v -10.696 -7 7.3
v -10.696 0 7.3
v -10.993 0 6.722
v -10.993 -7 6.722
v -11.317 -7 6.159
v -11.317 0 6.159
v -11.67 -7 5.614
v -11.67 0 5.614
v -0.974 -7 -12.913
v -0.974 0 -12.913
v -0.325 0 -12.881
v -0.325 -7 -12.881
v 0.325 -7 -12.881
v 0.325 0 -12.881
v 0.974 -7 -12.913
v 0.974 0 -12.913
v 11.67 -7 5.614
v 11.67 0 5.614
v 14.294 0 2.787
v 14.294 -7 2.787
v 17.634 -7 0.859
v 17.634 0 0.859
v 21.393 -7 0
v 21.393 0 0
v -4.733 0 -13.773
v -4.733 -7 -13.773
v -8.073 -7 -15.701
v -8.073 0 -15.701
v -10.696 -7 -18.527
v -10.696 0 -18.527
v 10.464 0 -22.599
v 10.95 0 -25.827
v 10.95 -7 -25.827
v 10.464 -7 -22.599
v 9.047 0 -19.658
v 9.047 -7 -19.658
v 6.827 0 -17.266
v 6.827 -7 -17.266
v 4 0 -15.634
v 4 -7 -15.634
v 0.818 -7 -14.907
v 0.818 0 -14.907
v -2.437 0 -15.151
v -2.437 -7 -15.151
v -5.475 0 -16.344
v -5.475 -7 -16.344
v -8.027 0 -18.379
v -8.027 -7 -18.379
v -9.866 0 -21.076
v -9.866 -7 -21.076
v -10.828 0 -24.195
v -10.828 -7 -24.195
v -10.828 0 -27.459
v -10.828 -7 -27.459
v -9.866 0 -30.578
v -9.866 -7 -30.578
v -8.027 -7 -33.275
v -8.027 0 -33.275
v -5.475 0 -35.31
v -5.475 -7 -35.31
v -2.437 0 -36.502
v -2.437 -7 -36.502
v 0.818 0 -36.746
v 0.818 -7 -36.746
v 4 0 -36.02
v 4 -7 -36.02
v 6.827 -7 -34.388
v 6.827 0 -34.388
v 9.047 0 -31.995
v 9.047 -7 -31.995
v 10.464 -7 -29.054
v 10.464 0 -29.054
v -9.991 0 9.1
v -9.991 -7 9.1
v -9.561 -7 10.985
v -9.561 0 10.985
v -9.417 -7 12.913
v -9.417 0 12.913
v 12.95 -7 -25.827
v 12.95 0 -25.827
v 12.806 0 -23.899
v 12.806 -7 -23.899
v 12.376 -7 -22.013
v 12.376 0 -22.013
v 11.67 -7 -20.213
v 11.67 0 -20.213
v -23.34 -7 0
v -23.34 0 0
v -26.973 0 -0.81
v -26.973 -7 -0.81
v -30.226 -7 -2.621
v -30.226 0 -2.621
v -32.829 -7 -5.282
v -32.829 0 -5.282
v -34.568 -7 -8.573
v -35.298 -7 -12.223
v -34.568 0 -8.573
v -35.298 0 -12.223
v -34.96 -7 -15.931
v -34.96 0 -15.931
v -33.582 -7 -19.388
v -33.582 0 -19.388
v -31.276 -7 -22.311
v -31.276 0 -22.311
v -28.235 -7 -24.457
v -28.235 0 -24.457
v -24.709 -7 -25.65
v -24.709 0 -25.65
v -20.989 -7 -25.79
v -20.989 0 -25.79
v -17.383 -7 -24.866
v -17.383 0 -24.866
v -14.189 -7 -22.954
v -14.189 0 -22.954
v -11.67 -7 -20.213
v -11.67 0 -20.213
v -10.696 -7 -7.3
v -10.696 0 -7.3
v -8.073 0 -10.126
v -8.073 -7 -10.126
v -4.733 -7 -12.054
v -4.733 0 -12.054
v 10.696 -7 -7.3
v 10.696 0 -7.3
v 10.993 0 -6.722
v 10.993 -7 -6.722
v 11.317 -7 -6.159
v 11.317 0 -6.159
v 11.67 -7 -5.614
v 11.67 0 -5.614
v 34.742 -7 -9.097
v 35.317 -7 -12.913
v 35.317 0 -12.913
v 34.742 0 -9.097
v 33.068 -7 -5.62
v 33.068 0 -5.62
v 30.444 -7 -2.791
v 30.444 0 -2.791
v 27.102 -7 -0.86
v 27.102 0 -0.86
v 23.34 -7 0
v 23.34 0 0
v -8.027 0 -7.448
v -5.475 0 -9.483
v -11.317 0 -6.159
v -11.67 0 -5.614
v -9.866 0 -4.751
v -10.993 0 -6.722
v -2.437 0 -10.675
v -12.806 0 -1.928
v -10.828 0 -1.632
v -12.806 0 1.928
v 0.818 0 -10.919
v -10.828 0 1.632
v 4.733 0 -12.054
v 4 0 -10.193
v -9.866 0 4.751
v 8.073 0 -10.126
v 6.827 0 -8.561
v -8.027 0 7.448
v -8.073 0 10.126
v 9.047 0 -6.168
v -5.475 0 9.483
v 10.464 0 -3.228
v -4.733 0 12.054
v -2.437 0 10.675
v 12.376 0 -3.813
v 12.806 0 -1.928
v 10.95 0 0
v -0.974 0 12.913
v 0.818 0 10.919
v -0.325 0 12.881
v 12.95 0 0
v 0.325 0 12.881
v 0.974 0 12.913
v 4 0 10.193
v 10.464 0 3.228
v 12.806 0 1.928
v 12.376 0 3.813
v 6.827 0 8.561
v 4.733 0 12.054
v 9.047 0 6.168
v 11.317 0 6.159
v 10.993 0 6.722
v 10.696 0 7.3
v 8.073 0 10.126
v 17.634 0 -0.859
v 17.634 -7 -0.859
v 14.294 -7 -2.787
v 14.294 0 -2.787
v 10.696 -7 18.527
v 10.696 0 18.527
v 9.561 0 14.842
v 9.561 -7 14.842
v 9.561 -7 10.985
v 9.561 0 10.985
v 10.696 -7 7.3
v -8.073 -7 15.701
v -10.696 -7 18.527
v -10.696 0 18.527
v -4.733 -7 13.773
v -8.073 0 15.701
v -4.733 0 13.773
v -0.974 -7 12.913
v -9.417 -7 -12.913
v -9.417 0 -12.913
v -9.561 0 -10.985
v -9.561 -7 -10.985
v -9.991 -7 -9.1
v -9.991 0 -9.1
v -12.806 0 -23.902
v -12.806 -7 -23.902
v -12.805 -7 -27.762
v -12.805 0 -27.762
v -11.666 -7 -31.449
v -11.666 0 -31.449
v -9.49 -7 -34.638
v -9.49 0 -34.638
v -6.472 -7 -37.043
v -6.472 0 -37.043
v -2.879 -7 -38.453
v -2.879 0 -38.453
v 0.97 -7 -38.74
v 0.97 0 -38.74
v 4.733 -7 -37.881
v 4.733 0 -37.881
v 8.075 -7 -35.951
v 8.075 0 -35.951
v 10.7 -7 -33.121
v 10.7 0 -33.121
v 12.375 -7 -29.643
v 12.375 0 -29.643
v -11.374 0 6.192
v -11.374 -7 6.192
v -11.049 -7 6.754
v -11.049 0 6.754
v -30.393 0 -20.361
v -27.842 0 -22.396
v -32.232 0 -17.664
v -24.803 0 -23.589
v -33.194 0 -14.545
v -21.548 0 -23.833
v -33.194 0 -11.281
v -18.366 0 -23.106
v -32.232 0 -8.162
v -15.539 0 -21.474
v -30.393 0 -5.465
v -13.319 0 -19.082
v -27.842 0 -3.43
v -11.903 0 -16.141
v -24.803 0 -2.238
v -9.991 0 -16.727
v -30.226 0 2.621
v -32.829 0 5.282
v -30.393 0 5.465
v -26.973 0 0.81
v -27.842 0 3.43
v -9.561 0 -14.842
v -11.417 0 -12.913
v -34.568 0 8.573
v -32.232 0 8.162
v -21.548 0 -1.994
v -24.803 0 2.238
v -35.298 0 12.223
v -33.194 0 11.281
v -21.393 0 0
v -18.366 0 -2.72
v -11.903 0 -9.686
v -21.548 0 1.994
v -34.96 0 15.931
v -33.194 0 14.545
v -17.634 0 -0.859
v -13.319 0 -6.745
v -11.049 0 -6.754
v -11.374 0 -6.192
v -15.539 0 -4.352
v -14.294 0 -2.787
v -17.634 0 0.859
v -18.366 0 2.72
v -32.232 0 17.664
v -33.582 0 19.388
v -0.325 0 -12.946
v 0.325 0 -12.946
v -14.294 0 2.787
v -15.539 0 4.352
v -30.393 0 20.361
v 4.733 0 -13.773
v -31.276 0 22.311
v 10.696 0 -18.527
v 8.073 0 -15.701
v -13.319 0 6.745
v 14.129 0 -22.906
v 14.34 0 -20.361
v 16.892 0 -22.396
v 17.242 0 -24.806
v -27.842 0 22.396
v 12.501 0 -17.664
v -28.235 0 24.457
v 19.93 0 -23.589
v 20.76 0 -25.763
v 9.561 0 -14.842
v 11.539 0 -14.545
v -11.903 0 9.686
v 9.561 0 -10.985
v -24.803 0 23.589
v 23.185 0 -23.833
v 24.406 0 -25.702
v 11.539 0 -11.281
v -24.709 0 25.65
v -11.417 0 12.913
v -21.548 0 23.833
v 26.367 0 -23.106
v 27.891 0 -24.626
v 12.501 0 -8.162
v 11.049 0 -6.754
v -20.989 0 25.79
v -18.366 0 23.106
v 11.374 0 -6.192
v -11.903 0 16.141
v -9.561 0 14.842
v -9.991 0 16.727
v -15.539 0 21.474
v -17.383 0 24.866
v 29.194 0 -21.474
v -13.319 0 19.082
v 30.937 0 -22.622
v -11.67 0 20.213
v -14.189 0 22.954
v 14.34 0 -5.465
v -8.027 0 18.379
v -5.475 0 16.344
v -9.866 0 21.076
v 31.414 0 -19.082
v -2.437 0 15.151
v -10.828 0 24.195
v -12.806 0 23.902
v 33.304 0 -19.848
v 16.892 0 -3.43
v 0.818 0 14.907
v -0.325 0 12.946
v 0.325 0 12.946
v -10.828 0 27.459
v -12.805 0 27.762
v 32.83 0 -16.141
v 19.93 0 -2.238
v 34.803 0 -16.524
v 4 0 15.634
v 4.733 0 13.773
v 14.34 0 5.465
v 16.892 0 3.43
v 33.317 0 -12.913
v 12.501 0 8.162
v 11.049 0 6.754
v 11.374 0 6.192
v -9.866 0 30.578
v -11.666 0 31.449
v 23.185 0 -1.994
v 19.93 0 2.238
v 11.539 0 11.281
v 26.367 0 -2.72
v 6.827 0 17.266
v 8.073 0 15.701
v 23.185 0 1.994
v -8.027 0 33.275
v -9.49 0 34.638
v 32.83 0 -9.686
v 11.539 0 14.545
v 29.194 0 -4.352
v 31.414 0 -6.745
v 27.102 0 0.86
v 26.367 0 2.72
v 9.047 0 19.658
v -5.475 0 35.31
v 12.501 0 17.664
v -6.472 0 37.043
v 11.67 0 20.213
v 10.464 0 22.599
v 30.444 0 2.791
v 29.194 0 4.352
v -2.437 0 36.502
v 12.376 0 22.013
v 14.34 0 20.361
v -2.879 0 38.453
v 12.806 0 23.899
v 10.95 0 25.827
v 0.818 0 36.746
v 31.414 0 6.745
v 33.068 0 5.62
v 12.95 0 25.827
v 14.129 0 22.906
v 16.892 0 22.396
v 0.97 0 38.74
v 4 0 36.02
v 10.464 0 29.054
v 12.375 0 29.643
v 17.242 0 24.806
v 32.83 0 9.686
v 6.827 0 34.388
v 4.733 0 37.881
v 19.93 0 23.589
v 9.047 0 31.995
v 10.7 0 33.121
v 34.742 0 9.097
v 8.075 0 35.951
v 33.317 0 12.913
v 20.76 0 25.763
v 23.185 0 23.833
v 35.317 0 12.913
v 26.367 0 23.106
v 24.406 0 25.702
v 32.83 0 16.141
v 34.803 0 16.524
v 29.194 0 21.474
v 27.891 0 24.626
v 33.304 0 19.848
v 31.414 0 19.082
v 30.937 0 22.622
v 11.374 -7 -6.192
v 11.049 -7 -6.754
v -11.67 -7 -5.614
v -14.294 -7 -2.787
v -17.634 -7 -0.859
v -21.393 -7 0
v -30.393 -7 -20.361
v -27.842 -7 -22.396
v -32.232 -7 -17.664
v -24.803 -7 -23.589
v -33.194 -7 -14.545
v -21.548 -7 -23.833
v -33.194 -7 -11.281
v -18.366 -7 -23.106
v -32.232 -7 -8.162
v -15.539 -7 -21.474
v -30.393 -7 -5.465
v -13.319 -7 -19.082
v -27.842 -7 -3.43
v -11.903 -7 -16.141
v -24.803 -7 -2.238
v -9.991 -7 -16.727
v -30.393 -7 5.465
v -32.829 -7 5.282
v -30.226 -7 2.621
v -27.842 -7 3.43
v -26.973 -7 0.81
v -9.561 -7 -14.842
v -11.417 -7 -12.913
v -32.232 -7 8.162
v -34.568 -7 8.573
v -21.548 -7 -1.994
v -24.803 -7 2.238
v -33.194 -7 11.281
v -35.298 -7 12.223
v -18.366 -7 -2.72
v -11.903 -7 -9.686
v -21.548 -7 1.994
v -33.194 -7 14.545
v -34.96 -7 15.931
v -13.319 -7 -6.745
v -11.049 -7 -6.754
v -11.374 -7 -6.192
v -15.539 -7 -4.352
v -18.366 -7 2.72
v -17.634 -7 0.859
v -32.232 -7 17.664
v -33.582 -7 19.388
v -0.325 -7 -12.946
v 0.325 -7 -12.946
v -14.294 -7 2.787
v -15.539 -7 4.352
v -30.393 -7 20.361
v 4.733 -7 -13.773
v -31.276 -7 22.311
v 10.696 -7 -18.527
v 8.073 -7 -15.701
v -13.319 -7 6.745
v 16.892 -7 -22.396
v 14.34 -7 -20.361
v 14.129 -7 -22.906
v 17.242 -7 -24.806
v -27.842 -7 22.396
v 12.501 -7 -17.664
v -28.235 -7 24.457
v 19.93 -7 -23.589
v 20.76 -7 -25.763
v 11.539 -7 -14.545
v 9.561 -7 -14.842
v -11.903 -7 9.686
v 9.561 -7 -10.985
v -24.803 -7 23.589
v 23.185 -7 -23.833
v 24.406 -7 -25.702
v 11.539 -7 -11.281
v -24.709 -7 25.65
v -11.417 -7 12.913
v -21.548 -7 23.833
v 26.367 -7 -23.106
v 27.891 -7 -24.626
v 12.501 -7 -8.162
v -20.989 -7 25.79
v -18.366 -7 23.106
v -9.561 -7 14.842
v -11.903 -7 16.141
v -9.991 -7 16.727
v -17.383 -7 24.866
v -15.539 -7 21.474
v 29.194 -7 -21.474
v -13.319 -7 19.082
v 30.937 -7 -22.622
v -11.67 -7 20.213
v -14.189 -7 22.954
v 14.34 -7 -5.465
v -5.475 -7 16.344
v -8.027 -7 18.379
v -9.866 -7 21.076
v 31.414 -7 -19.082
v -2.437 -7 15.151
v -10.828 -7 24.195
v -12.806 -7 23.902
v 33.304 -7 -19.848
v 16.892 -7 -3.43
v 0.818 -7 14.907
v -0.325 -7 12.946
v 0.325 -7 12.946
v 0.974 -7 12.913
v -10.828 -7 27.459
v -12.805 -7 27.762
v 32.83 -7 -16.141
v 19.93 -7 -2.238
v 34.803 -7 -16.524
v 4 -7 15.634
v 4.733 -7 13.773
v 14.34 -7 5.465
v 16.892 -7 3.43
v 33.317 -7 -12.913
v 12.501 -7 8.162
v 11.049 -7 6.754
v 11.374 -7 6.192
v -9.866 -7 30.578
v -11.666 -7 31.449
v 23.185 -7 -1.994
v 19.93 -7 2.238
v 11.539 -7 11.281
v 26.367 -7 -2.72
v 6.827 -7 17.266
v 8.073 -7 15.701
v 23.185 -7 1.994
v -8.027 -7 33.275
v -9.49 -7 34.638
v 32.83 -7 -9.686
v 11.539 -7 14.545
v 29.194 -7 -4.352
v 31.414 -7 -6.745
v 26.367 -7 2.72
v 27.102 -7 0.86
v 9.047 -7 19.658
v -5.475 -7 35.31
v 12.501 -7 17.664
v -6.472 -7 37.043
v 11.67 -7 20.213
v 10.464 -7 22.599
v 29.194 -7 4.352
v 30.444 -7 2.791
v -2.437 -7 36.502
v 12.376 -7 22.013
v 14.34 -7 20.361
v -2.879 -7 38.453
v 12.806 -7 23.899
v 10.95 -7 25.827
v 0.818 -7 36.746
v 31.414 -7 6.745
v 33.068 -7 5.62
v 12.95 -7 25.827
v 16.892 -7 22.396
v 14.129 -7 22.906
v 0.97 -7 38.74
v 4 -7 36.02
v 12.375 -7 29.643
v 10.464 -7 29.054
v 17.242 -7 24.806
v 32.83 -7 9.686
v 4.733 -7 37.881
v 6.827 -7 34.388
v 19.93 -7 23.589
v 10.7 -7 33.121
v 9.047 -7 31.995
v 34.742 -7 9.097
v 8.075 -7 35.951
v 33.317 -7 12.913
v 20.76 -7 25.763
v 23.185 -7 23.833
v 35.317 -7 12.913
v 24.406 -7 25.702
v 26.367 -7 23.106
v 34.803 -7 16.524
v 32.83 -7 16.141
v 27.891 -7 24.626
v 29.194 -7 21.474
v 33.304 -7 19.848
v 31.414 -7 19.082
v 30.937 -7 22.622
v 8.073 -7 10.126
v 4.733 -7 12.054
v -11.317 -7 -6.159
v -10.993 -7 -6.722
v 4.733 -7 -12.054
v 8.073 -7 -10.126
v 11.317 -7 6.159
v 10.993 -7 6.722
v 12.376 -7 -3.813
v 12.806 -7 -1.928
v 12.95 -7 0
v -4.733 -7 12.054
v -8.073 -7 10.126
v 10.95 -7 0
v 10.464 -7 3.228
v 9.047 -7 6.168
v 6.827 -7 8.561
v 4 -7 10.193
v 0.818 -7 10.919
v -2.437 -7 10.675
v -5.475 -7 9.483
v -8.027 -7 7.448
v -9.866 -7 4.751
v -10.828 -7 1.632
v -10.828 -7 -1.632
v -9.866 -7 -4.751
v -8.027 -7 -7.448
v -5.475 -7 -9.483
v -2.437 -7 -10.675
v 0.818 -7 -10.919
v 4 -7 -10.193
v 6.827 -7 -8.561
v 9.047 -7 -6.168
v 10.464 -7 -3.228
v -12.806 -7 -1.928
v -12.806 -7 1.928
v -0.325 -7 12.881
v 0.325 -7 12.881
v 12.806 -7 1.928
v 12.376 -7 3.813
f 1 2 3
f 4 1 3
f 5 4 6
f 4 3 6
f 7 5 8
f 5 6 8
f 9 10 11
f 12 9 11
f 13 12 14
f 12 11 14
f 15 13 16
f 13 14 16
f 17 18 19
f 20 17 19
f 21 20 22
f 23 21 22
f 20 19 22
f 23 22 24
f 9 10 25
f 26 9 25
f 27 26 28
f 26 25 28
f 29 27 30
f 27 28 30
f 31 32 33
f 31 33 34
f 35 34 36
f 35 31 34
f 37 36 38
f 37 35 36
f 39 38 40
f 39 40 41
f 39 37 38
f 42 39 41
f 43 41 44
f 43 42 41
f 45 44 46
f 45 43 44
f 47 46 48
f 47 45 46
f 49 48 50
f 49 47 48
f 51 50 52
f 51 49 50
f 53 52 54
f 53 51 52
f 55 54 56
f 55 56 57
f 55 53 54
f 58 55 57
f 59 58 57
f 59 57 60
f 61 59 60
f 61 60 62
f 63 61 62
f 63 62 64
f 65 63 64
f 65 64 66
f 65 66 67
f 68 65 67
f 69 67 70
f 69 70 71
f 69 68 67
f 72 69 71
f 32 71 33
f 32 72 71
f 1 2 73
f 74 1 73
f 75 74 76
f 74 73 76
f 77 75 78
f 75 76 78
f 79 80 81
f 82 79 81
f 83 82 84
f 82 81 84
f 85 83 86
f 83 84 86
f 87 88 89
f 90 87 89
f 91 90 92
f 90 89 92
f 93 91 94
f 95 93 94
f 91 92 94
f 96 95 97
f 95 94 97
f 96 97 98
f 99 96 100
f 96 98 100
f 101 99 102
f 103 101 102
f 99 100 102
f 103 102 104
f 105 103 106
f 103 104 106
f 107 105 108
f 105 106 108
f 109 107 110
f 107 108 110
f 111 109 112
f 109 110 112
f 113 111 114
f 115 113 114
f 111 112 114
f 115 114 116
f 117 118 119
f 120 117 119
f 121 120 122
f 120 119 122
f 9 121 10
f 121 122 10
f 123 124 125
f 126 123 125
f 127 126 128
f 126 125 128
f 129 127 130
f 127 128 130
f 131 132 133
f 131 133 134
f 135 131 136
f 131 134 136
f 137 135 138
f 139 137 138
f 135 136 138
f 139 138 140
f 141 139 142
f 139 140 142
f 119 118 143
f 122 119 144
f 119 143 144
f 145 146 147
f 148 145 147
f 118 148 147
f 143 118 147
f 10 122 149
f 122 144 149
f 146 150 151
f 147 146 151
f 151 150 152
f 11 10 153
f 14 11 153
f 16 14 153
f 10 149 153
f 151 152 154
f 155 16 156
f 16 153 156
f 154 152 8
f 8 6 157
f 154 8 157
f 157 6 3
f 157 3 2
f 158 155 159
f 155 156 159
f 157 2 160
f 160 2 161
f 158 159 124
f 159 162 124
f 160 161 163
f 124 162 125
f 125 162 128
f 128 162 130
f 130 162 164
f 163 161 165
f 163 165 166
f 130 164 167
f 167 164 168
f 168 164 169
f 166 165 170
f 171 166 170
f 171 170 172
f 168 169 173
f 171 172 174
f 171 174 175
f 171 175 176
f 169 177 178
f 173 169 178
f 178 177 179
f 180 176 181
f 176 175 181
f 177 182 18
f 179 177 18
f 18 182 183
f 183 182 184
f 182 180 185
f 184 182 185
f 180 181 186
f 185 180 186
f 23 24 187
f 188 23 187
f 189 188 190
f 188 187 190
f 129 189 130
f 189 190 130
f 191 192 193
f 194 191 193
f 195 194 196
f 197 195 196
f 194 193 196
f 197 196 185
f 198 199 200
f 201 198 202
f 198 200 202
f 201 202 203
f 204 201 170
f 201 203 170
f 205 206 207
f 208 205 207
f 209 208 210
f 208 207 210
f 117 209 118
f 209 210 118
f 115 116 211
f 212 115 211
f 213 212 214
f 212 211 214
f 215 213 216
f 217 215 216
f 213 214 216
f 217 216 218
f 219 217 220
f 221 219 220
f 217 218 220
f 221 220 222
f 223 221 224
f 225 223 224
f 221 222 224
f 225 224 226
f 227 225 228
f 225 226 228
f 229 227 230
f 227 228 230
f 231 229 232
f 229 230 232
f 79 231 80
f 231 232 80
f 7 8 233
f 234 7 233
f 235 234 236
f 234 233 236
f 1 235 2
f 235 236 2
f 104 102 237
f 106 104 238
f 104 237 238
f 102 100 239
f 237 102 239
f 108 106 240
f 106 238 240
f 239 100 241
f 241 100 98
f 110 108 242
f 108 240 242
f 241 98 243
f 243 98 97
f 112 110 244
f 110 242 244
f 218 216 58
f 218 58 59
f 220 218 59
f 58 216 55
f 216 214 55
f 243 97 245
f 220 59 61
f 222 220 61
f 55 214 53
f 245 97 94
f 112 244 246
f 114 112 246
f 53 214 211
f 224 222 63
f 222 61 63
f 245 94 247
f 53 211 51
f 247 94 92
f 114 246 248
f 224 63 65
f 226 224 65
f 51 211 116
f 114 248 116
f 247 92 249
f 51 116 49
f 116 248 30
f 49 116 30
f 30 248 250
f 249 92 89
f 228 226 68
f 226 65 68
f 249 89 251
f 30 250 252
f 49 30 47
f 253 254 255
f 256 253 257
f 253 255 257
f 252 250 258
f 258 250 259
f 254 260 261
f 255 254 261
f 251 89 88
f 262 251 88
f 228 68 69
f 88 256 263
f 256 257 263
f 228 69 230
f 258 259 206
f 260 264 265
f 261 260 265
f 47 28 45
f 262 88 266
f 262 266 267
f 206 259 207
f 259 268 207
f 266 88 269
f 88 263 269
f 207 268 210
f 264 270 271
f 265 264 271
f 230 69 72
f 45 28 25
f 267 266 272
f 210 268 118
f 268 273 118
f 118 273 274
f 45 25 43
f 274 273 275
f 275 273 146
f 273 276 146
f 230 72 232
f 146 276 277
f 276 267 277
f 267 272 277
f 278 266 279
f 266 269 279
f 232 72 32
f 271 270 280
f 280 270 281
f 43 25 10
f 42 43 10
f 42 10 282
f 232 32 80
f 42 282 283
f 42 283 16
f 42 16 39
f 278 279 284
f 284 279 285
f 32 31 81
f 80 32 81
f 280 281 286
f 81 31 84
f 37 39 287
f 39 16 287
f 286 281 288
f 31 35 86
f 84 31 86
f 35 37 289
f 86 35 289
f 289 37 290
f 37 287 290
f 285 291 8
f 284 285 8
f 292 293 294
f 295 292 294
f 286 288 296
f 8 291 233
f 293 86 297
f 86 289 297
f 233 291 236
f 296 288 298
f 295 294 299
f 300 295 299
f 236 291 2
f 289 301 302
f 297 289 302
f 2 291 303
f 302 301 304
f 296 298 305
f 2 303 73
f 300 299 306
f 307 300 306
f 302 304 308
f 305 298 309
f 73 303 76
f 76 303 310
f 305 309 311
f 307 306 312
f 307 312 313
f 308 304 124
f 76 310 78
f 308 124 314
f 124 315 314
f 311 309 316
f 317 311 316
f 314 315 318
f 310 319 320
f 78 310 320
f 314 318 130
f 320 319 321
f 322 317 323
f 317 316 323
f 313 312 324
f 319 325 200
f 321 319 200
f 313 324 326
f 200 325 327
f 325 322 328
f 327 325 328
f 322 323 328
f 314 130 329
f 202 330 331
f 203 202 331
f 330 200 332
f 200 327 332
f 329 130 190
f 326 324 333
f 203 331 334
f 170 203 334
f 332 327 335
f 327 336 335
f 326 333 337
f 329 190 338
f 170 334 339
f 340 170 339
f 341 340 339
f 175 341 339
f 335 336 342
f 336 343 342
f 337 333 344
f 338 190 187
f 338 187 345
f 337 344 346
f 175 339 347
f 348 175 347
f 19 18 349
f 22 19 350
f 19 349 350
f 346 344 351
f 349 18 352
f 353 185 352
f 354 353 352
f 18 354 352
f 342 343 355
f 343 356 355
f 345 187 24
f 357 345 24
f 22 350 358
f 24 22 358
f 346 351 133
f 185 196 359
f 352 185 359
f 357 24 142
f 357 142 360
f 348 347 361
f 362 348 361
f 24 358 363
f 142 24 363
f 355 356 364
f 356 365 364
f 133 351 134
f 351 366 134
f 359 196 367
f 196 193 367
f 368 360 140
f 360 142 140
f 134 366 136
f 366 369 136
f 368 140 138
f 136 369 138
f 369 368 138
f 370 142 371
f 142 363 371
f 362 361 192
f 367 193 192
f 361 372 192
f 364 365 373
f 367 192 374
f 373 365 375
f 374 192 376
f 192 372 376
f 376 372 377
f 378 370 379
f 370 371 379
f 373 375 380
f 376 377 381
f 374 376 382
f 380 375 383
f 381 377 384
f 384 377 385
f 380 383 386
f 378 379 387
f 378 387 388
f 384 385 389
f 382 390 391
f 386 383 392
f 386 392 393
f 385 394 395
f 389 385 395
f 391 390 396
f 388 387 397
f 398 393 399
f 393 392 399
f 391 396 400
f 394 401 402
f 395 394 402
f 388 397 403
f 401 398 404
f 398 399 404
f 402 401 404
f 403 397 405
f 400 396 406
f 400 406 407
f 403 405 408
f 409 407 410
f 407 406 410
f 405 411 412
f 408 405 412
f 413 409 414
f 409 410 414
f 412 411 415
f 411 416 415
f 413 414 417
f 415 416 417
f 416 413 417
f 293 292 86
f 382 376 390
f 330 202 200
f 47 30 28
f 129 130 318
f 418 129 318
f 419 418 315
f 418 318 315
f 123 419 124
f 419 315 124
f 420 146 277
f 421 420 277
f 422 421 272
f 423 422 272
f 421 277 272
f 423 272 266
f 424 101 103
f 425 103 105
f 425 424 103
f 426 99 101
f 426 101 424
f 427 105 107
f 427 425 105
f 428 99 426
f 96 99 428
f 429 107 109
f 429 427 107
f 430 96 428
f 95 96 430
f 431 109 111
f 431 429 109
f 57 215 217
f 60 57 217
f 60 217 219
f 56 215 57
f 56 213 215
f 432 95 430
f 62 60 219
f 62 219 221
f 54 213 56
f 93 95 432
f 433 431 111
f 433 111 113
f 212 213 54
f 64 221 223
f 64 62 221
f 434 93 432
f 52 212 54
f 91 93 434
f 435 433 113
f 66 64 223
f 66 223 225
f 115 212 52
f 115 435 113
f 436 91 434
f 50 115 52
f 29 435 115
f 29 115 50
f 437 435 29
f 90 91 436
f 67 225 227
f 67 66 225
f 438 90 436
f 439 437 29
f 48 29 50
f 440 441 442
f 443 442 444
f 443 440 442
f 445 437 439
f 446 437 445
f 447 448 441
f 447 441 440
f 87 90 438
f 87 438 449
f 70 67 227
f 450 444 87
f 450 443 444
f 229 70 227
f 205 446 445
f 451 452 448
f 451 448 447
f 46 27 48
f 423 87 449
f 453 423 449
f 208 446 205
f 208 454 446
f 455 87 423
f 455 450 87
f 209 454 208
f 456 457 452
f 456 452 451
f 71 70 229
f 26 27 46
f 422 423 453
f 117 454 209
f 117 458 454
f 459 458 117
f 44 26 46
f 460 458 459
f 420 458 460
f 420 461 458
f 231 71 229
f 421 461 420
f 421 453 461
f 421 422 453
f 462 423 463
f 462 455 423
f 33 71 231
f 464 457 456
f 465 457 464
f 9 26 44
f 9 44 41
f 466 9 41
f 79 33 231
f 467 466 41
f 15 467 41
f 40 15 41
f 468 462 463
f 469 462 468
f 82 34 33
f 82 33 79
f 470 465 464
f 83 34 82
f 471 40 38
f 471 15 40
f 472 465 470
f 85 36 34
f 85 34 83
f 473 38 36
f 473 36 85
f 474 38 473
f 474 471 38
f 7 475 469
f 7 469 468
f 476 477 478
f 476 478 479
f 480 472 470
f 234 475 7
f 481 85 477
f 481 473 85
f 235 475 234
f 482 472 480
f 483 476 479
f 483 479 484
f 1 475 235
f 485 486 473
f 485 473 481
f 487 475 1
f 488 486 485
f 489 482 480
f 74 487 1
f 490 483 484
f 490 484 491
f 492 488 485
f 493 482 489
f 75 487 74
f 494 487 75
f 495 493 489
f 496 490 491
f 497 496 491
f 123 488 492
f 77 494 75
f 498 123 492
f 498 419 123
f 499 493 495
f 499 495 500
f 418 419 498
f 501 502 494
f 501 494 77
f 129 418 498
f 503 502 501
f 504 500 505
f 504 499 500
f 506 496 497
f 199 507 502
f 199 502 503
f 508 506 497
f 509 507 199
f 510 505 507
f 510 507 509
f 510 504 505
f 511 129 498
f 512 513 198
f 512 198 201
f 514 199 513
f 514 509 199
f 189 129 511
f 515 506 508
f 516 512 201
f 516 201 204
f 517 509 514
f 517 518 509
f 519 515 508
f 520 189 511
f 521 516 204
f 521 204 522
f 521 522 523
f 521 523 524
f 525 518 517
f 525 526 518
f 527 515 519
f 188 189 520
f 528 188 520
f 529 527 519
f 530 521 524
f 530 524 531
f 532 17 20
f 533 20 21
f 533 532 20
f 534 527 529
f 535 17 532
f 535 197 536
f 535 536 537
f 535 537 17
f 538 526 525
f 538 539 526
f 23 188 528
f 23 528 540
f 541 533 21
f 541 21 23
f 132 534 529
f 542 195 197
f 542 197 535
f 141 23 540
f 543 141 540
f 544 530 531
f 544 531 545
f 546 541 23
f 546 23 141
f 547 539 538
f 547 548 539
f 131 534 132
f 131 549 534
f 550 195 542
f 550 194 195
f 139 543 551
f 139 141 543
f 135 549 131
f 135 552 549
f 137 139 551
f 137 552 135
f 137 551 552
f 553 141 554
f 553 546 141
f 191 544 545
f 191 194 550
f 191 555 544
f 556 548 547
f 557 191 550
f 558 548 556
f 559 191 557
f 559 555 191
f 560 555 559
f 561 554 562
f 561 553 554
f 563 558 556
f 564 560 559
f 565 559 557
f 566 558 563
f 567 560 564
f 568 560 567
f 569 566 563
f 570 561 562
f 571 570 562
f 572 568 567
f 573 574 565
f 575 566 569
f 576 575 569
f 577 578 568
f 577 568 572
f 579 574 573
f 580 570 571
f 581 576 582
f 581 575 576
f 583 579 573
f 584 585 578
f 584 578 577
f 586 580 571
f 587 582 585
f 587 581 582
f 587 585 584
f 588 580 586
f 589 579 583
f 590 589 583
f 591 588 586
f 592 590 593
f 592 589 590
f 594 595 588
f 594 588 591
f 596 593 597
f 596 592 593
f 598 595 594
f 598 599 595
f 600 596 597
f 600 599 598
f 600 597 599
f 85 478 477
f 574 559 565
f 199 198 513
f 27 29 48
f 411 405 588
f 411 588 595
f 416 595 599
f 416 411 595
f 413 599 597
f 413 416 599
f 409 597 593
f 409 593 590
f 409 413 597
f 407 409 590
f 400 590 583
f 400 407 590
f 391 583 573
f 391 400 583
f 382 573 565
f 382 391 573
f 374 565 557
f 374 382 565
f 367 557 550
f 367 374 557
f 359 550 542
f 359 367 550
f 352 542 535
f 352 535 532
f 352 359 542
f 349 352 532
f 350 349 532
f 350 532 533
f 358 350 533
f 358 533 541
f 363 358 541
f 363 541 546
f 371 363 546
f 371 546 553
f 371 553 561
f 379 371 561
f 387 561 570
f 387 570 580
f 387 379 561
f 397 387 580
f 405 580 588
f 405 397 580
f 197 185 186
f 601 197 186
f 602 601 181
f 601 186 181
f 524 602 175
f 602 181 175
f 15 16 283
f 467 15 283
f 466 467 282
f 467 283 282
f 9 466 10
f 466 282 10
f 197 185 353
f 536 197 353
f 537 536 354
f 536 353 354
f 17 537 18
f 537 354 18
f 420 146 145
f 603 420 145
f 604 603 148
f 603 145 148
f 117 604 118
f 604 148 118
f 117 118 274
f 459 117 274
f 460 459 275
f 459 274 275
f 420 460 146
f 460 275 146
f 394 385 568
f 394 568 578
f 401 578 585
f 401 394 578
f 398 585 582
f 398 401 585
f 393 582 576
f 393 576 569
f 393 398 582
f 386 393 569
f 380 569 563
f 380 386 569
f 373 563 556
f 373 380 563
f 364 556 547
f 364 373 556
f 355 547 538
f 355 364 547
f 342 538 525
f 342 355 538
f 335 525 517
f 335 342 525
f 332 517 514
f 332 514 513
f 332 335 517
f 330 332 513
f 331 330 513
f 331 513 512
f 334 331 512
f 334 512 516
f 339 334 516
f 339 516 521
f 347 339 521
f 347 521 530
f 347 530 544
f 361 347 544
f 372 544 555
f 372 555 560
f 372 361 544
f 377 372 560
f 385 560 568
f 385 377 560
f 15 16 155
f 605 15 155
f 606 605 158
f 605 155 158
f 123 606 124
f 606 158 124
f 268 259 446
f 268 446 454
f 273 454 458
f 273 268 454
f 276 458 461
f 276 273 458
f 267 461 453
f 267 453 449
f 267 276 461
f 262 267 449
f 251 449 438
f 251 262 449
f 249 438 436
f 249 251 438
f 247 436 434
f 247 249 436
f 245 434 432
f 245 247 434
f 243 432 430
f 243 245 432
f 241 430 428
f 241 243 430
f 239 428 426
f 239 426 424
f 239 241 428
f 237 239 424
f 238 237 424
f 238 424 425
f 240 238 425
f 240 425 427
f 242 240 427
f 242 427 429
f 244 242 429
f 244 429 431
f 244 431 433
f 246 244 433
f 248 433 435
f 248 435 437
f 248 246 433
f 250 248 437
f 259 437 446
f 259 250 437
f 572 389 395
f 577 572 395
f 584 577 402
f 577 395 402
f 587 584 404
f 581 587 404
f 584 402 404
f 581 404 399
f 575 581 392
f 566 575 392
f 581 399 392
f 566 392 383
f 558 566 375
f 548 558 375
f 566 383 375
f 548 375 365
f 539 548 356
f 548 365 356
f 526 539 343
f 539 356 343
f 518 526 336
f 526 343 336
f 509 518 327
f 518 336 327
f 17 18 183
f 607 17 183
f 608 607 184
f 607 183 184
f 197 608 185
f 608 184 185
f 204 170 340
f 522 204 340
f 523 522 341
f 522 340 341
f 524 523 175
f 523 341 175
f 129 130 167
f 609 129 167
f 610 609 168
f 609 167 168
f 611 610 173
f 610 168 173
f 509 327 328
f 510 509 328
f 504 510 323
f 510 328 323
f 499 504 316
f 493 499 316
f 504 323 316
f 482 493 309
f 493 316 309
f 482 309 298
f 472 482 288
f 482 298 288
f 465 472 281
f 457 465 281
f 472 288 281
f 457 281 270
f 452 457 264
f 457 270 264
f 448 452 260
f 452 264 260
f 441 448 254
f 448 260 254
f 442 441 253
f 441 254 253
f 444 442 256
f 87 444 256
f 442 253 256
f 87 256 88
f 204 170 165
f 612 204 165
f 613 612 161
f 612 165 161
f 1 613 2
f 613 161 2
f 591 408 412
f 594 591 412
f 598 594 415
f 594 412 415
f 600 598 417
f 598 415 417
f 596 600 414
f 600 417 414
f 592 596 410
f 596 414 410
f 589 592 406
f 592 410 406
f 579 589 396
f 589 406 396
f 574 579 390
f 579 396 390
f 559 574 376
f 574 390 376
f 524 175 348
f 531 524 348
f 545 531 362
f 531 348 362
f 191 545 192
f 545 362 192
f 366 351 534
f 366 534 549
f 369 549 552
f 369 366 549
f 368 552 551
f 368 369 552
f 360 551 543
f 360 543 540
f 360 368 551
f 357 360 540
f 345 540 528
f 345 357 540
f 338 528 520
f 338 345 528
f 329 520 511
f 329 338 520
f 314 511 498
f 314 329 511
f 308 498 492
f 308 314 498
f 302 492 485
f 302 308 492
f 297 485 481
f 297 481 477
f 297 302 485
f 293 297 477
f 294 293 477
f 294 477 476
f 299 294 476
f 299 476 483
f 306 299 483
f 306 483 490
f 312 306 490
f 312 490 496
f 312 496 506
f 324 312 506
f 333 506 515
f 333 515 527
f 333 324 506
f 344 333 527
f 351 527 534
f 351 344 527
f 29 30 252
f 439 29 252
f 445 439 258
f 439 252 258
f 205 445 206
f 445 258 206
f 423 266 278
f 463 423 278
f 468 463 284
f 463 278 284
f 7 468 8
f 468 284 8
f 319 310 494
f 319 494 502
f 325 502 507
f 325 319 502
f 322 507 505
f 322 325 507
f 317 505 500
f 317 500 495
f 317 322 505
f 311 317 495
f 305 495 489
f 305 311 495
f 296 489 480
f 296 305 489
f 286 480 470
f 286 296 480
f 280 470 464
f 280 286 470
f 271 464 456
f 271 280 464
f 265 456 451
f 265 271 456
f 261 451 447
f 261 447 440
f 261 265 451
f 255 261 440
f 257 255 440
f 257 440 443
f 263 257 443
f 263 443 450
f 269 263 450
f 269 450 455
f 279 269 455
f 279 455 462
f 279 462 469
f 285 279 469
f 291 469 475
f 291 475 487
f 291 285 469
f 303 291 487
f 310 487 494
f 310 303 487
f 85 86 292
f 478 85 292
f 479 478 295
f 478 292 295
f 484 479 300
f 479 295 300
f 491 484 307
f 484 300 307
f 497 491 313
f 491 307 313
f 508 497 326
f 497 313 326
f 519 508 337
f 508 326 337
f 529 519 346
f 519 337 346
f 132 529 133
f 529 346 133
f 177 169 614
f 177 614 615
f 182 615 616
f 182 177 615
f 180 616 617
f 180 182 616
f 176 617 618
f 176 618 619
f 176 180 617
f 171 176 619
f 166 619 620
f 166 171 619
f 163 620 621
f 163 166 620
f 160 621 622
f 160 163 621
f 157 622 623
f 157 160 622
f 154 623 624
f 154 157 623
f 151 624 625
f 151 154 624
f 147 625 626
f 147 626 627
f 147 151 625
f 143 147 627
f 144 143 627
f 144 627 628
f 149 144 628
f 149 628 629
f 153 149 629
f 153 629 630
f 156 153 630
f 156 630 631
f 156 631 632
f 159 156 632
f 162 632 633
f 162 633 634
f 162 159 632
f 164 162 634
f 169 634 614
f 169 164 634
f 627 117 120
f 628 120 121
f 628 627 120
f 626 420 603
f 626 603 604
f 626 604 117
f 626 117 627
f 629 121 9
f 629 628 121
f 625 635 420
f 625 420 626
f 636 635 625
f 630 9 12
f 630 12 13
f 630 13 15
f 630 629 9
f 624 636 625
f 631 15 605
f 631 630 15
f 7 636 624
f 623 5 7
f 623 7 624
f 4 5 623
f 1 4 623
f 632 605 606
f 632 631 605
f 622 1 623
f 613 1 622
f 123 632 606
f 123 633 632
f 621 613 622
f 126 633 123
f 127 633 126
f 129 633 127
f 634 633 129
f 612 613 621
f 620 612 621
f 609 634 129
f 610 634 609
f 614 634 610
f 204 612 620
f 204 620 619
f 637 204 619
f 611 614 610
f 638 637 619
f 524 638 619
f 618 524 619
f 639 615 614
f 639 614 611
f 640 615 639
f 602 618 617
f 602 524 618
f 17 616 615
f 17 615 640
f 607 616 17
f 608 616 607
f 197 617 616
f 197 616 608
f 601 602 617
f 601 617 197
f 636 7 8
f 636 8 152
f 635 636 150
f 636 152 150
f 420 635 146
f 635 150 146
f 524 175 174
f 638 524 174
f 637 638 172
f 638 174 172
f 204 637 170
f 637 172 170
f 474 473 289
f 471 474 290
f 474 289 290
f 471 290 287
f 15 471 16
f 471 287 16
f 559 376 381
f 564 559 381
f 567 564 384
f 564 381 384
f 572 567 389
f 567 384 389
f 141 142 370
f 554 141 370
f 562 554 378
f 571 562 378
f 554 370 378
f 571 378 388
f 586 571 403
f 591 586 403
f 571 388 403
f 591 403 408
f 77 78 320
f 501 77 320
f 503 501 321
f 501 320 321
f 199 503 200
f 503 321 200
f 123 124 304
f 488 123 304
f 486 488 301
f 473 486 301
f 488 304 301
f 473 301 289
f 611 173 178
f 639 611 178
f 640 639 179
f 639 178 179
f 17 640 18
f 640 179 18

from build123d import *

# Parameters (mm, degrees)
F0_R     = 10.95
F1_DEPTH = 7


with BuildPart() as f1:
    # F0 (on Front) → F1 (new body)
    with BuildSketch(Plane.XZ):
        with BuildLine():
            ThreePointArc((10.696482594, 7.2998472083), (11.2150292849, 6.4750001766), (11.6700944231, 5.6135020534))
            ThreePointArc((11.6700944231, 5.6135020534), (15.8915777302, 1.6983195167), (21.3929672299, 0))
            ThreePointArc((21.3929672299, 0), (22.3665767103, 0.0366509154), (23.3401861908, 0))
            ThreePointArc((23.3401861908, 0), (31.8615949507, 4.1072643351), (35.3165767103, 12.9133490846))
            ThreePointArc((35.3165767103, 12.9133490846), (26.1864613412, 25.2871513057), (11.6700930954, 20.2131941703))
            ThreePointArc((11.6700930954, 20.2131941703), (11.215028979, 19.3516981691), (10.6964836149, 18.5268530834))
            ThreePointArc((10.6964836149, 18.5268530834), (9.4165767103, 12.9133502622), (10.696482594, 7.2998472083))
        make_face()
        with Locations((22.3665767103, 12.9133490846)):
            Circle(F0_R, mode=Mode.SUBTRACT)
        with BuildLine():
            ThreePointArc((21.3929672299, 0), (15.8915777302, -1.6983195167), (11.6700944231, -5.6135020534))
            ThreePointArc((11.6700944231, -5.6135020534), (11.2150292849, -6.4750001766), (10.696482594, -7.2998472083))
            ThreePointArc((10.696482594, -7.2998472083), (9.4165767103, -12.9133502622), (10.6964836149, -18.5268530834))
            ThreePointArc((10.6964836149, -18.5268530834), (11.215028979, -19.3516981691), (11.6700930954, -20.2131941703))
            ThreePointArc((11.6700930954, -20.2131941703), (26.1864613412, -25.2871513057), (35.3165767103, -12.9133490846))
            ThreePointArc((35.3165767103, -12.9133490846), (31.8615949507, -4.1072643351), (23.3401861908, 0))
            ThreePointArc((23.3401861908, 0), (22.3665767103, -0.0366509154), (21.3929672299, 0))
        make_face()
        with Locations((22.3665767103, -12.9133490846)):
            Circle(F0_R, mode=Mode.SUBTRACT)
        with BuildLine():
            ThreePointArc((23.3401861908, 0), (22.3665767103, 0.0366509154), (21.3929672299, 0))
            ThreePointArc((21.3929672299, 0), (22.3665767103, -0.0366509154), (23.3401861908, 0))
        make_face()
        with BuildLine():
            ThreePointArc((-0.9736118291, 12.9133492616), (0, 12.9500003532), (0.9736118291, 12.9133492616))
            ThreePointArc((0.9736118291, 12.9133492616), (6.4750010199, 14.6116697789), (10.6964836149, 18.5268530834))
            ThreePointArc((10.6964836149, 18.5268530834), (11.1515477313, 19.3883490846), (11.6700930954, 20.2131941703))
            ThreePointArc((11.6700930954, 20.2131941703), (12.6259693803, 22.9479141884), (12.95, 25.8266981691))
            ThreePointArc((12.95, 25.8266981691), (-2.8787839807, 38.4526675494), (-11.6700930954, 20.2131941703))
            ThreePointArc((-11.6700930954, 20.2131941703), (-11.1515477313, 19.3883490846), (-10.6964836149, 18.5268530834))
            ThreePointArc((-10.6964836149, 18.5268530834), (-6.4750010199, 14.6116697789), (-0.9736118291, 12.9133492616))
        make_face()
        with Locations((0, 25.8266981691)):
            Circle(F0_R, mode=Mode.SUBTRACT)
        with BuildLine():
            ThreePointArc((11.6700930954, 20.2131941703), (11.1515477313, 19.3883490846), (10.6964836149, 18.5268530834))
            ThreePointArc((10.6964836149, 18.5268530834), (11.215028979, 19.3516981691), (11.6700930954, 20.2131941703))
        make_face()
        with BuildLine():
            ThreePointArc((10.6964836149, -18.5268530834), (6.4750010199, -14.6116697789), (0.9736118291, -12.9133492616))
            ThreePointArc((0.9736118291, -12.9133492616), (0, -12.9500003532), (-0.9736118291, -12.9133492616))
            ThreePointArc((-0.9736118291, -12.9133492616), (-6.4750010199, -14.6116697789), (-10.6964836149, -18.5268530834))
            ThreePointArc((-10.6964836149, -18.5268530834), (-11.1515477313, -19.3883490846), (-11.6700930954, -20.2131941703))
            ThreePointArc((-11.6700930954, -20.2131941703), (-2.8787839807, -38.4526675494), (12.95, -25.8266981691))
            ThreePointArc((12.95, -25.8266981691), (12.6259693803, -22.9479141884), (11.6700930954, -20.2131941703))
            ThreePointArc((11.6700930954, -20.2131941703), (11.1515477313, -19.3883490846), (10.6964836149, -18.5268530834))
        make_face()
        with Locations((0, -25.8266981691)):
            Circle(F0_R, mode=Mode.SUBTRACT)
        with BuildLine():
            ThreePointArc((11.6700930954, -20.2131941703), (11.215028979, -19.3516981691), (10.6964836149, -18.5268530834))
            ThreePointArc((10.6964836149, -18.5268530834), (11.1515477313, -19.3883490846), (11.6700930954, -20.2131941703))
        make_face()
        with BuildLine():
            ThreePointArc((-11.6700944231, 5.6135020534), (-11.2150292849, 6.4750001766), (-10.696482594, 7.2998472083))
            ThreePointArc((-10.696482594, 7.2998472083), (-9.7406070682, 10.0345662521), (-9.4165767103, 12.9133490846))
            ThreePointArc((-9.4165767103, 12.9133490846), (-9.74060733, 15.7921330652), (-10.6964836149, 18.5268530834))
            ThreePointArc((-10.6964836149, 18.5268530834), (-11.215028979, 19.3516981691), (-11.6700930954, 20.2131941703))
            ThreePointArc((-11.6700930954, 20.2131941703), (-33.5816056893, 19.3883490846), (-23.3401861908, 0))
            ThreePointArc((-23.3401861908, 0), (-22.3665767103, 0.0366509154), (-21.3929672299, 0))
            ThreePointArc((-21.3929672299, 0), (-15.8915777302, 1.6983195167), (-11.6700944231, 5.6135020534))
        make_face()
        with Locations((-22.3665767103, 12.9133490846)):
            Circle(F0_R, mode=Mode.SUBTRACT)
        with BuildLine():
            ThreePointArc((-11.6700930954, 20.2131941703), (-11.215028979, 19.3516981691), (-10.6964836149, 18.5268530834))
            ThreePointArc((-10.6964836149, 18.5268530834), (-11.1515477313, 19.3883490846), (-11.6700930954, 20.2131941703))
        make_face()
        with BuildLine():
            ThreePointArc((-9.4165767103, -12.9133490846), (-9.7406070682, -10.0345662521), (-10.696482594, -7.2998472083))
            ThreePointArc((-10.696482594, -7.2998472083), (-11.2150292849, -6.4750001766), (-11.6700944231, -5.6135020534))
            ThreePointArc((-11.6700944231, -5.6135020534), (-15.8915777302, -1.6983195167), (-21.3929672299, 0))
            ThreePointArc((-21.3929672299, 0), (-22.3665767103, -0.0366509154), (-23.3401861908, 0))
            ThreePointArc((-23.3401861908, 0), (-33.5816056893, -19.3883490846), (-11.6700930954, -20.2131941703))
            ThreePointArc((-11.6700930954, -20.2131941703), (-11.215028979, -19.3516981691), (-10.6964836149, -18.5268530834))
            ThreePointArc((-10.6964836149, -18.5268530834), (-9.74060733, -15.7921330652), (-9.4165767103, -12.9133490846))
        make_face()
        with Locations((-22.3665767103, -12.9133490846)):
            Circle(F0_R, mode=Mode.SUBTRACT)
        with BuildLine():
            ThreePointArc((-11.6700930954, -20.2131941703), (-11.1515477313, -19.3883490846), (-10.6964836149, -18.5268530834))
            ThreePointArc((-10.6964836149, -18.5268530834), (-11.215028979, -19.3516981691), (-11.6700930954, -20.2131941703))
        make_face()
        with BuildLine():
            ThreePointArc((-23.3401861908, 0), (-22.3665767103, -0.0366509154), (-21.3929672299, 0))
            ThreePointArc((-21.3929672299, 0), (-22.3665767103, 0.0366509154), (-23.3401861908, 0))
        make_face()
    extrude(amount=F1_DEPTH)


with BuildPart() as f1b:
    # F0 (on Front) → F1, piece 2 (new body)
    with BuildSketch(Plane.XZ):
        with BuildLine():
            ThreePointArc((11.6700944231, -5.6135020534), (12.6259699835, -2.878782924), (12.9500003532, 0))
            ThreePointArc((12.9500003532, 0), (12.6259699835, 2.878782924), (11.6700944231, 5.6135020534))
            ThreePointArc((11.6700944231, 5.6135020534), (11.1515477313, 6.4383490846), (10.696482594, 7.2998472083))
            ThreePointArc((10.696482594, 7.2998472083), (6.4750001766, 11.2150292849), (0.9736118291, 12.9133492616))
            ThreePointArc((0.9736118291, 12.9133492616), (0, 12.8766981691), (-0.9736118291, 12.9133492616))
            ThreePointArc((-0.9736118291, 12.9133492616), (-6.4750001766, 11.2150292849), (-10.696482594, 7.2998472083))
            ThreePointArc((-10.696482594, 7.2998472083), (-11.1515477313, 6.4383490846), (-11.6700944231, 5.6135020534))
            ThreePointArc((-11.6700944231, 5.6135020534), (-12.9500003532, 0), (-11.6700944231, -5.6135020534))
            ThreePointArc((-11.6700944231, -5.6135020534), (-11.1515477313, -6.4383490846), (-10.696482594, -7.2998472083))
            ThreePointArc((-10.696482594, -7.2998472083), (-6.4750001766, -11.2150292849), (-0.9736118291, -12.9133492616))
            ThreePointArc((-0.9736118291, -12.9133492616), (0, -12.8766981691), (0.9736118291, -12.9133492616))
            ThreePointArc((0.9736118291, -12.9133492616), (6.4750001766, -11.2150292849), (10.696482594, -7.2998472083))
            ThreePointArc((10.696482594, -7.2998472083), (11.1515477313, -6.4383490846), (11.6700944231, -5.6135020534))
        make_face()
        Circle(F0_R, mode=Mode.SUBTRACT)
    extrude(amount=F1_DEPTH)


solid = Compound([f1.part, f1b.part])
